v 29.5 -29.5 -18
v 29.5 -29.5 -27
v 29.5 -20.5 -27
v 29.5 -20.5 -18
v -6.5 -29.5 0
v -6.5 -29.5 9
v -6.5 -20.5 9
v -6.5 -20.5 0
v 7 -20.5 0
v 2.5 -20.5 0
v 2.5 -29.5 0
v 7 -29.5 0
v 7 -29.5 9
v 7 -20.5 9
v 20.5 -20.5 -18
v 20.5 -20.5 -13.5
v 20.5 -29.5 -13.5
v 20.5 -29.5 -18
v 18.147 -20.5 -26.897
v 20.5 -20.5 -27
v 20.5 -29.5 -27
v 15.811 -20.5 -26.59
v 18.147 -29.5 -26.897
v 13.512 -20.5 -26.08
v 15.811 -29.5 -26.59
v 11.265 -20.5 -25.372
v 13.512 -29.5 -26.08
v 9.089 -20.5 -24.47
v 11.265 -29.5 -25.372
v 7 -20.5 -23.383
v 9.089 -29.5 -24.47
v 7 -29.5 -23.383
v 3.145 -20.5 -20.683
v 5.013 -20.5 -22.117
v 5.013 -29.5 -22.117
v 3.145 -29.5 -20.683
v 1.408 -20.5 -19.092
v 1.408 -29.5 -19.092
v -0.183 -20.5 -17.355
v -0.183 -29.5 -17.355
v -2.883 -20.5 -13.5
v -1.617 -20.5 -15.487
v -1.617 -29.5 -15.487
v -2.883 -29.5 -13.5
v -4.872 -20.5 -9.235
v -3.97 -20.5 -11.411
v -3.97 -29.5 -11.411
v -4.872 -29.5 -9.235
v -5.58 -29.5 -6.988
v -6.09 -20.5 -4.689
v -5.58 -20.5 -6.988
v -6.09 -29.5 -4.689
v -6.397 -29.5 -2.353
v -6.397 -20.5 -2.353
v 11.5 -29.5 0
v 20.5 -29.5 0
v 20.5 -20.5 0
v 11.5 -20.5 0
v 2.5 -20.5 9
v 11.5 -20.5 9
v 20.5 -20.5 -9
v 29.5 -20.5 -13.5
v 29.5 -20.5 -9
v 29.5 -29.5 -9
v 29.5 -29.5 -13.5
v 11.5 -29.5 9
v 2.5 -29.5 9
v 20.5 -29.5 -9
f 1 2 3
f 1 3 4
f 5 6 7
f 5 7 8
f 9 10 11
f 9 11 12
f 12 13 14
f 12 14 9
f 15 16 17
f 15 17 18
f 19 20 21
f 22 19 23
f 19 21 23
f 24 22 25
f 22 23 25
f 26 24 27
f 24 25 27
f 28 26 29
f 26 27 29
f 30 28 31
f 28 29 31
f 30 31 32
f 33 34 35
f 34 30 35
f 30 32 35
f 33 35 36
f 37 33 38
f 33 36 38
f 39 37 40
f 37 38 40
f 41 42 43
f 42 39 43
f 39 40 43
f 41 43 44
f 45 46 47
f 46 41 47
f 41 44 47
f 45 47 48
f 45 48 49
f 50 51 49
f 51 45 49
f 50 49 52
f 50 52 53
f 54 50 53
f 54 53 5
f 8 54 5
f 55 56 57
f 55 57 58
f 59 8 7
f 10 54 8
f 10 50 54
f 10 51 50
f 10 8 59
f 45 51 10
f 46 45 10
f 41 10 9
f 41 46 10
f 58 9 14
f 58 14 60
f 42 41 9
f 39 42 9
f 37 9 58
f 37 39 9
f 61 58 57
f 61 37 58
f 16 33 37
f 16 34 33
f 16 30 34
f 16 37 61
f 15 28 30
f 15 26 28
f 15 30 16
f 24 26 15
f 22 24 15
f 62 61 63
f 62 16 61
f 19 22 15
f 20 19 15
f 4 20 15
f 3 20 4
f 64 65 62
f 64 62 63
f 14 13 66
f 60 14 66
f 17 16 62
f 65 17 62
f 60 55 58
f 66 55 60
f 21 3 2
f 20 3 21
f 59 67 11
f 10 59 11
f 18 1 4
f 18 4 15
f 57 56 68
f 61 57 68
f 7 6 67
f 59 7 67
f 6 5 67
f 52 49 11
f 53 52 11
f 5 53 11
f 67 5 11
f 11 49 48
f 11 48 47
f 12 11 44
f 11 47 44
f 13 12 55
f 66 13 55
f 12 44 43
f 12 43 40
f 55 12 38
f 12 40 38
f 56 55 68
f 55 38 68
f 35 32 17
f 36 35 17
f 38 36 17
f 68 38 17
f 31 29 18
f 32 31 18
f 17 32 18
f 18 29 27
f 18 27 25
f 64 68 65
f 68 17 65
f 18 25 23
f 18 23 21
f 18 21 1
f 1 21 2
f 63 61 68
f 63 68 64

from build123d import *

# Parameters (mm, degrees)
SKETCH1_R                = 8
SKETCH1_R_2              = 4
BOSS_EXTRUDE1_DEPTH      = 9
BOSS_EXTRUDE1_2_DEPTH    = 9
SKETCH2_R                = 4
BOSS_EXTRUDE3_DEPTH      = 9
FILLET1_R                = 1
CUT_EXTRUDE1_DEPTH       = 214.789616212
SKETCH4_W                = 9
SKETCH4_H                = 27
BOSS_EXTRUDE4_DEPTH      = 75
BOSS_EXTRUDE5_START      = 9
SKETCH5_R                = 25
SKETCH5_R_2              = 4
BOSS_EXTRUDE5_DEPTH      = 9
BOSS_EXTRUDE6_DEPTH      = 4.5
BOSS_EXTRUDE6_DEPTH_BACK = 4.5
BOSS_EXTRUDE7_DEPTH      = 4.5
BOSS_EXTRUDE7_DEPTH_BACK = 4.5
BOSS_EXTRUDE7_START      = -25
SKETCH9_W                = 9
SKETCH9_H                = 7
SKETCH9_H_2              = 9
CUT_EXTRUDE2_DEPTH       = 217.612557346
CUT_EXTRUDE3_DEPTH       = 210.043655728
CUT_EXTRUDE3_DEPTH_BACK  = 210.043655728
SKETCH10_W               = 378.062868676
SKETCH10_H               = 121.353513402
SKETCH10_W_2             = 4.5
SKETCH10_H_2             = 9
SKETCH10_W_3             = 9
SKETCH10_H_3             = 4.5
CUT_EXTRUDE4_DEPTH       = 85.995588121
CUT_EXTRUDE4_DEPTH_BACK  = 85.995588121
SKETCH11_W               = 41.044011783
SKETCH11_H               = 27.30816427
SKETCH11_H_2             = 47.722771097


with BuildPart() as part:
    # Sketch1 → Boss-Extrude1 (new body)
    with BuildSketch(Plane.XY):
        with Locations((-125, 0)):
            Circle(SKETCH1_R)
        with Locations((-125, 0)):
            Circle(SKETCH1_R_2, mode=Mode.SUBTRACT)
    extrude(amount=BOSS_EXTRUDE1_DEPTH)



with BuildPart() as body_2:
    # Sketch1 → Boss-Extrude1 2 (new body)
    with BuildSketch(Plane.XY):
        with Locations((125, 0)):
            Circle(SKETCH1_R)
        with Locations((125, 0)):
            Circle(SKETCH1_R_2, mode=Mode.SUBTRACT)
    extrude(amount=BOSS_EXTRUDE1_2_DEPTH)


with BuildPart() as part_1:
    add(part.part)

    add(body_2.part)  # Boss-Extrude3 merges body 2
    # Sketch2 → Boss-Extrude3 (add)
    with BuildSketch(Plane.XY):
        with BuildLine():
            Line((-175, -75), (125, -75))
            ThreePointArc((125, -75), (130.131670325, -43.377223009), (145.000000492, -14.999999344))
            ThreePointArc((145.000000492, -14.999999344), (143.981414944, 16.269784471), (113.235294528, 22.058823748))
            ThreePointArc((113.235294528, 22.058823748), (25.000000075, 0), (-63.235294395, 22.058823677))
            ThreePointArc((-63.235294395, 22.058823677), (-75.420498385, 24.996463372), (-87.499999896, 21.650635154))
            ThreePointArc((-87.499999896, 21.650635154), (-99.999999954, 18.301270189), (-112.500000024, 21.650635108))
            ThreePointArc((-112.500000024, 21.650635108), (-124.99999995, 25), (-137.49999989, 21.650635158))
            ThreePointArc((-137.49999989, 21.650635158), (-149.999999954, 18.301270189), (-162.50000003, 21.650635112))
            ThreePointArc((-162.50000003, 21.650635112), (-193.705072901, 16.586749162), (-195.000000551, -14.999999265))
            ThreePointArc((-195.000000551, -14.999999265), (-180.13167034, -43.377222962), (-175, -75))
        make_face()
        with Locations((125, 0)):
            Circle(SKETCH2_R, mode=Mode.SUBTRACT)
        with Locations((-175, 0)):
            Circle(SKETCH2_R, mode=Mode.SUBTRACT)
        with Locations((-125, 0)):
            Circle(SKETCH2_R, mode=Mode.SUBTRACT)
        with Locations((-75, 0)):
            Circle(SKETCH2_R, mode=Mode.SUBTRACT)
    extrude(amount=BOSS_EXTRUDE3_DEPTH)

    # Fillet1
    fillet1_edges = [part_1.edges().sort_by_distance(p)[0] for p in [
        (-175, -75, 4.5),
        (125, -75, 4.5),
    ]]
    fillet(fillet1_edges, radius=FILLET1_R)

    # Sketch3 → Cut-Extrude1 (cut, through all)
    with BuildSketch(Plane.XY):
        Polygon((25, 0), (25, -75), (150, -75), (150, 25), (25, 25), align=None)
    extrude(amount=CUT_EXTRUDE1_DEPTH, mode=Mode.SUBTRACT)

    # Sketch4 → Boss-Extrude4 (add)
    with BuildSketch(Plane.XZ.offset(75)):
        with Locations((25, -4.5)):
            Rectangle(SKETCH4_W, SKETCH4_H)
    extrude(amount=-BOSS_EXTRUDE4_DEPTH)

    # Sketch5 → Boss-Extrude5 (add)
    # profile 1 of 4: a face of its own
    with BuildSketch(Plane(origin=(0, 0, -18), x_dir=(-1, 0, 0), z_dir=(0, 0, -1)).offset(BOSS_EXTRUDE5_START)):
        with BuildLine():
            ThreePointArc((-145.000000304, -14.999999594), (-130.131670275, -43.377223158), (-125, -75))
            Line((-125, -75), (-29.5, -75))
            Line((-29.5, -75), (-29.5, 0))
            Line((-29.5, 0), (-100, 0))
            ThreePointArc((-100, 0), (-117.09430609, -23.717082532), (-145.000000304, -14.999999594))
        make_face()
    # profile 2 of 4: a face of its own
    with BuildSketch(Plane(origin=(0, 0, -18), x_dir=(-1, 0, 0), z_dir=(0, 0, -1)).offset(BOSS_EXTRUDE5_START)):
        with Locations((-125, 0)):
            Circle(SKETCH5_R)
        with Locations((-125, 0)):
            Circle(SKETCH5_R_2, mode=Mode.SUBTRACT)
    # profile 3 of 4: a face of its own
    with BuildSketch(Plane(origin=(0, 0, -18), x_dir=(-1, 0, 0), z_dir=(0, 0, -1)).offset(BOSS_EXTRUDE5_START)):
        Polygon((-29.5, 0), (-29.5, -75), (-20.5, -75), (-20.5, 0), (-25, 0), align=None)
    # profile 4 of 4: a face of its own
    with BuildSketch(Plane(origin=(0, 0, -18), x_dir=(-1, 0, 0), z_dir=(0, 0, -1)).offset(BOSS_EXTRUDE5_START)):
        with BuildLine():
            Line((-100, 0), (-29.5, 0))
            Line((-29.5, 0), (-25, 0))
            ThreePointArc((-25, 0), (-70.475429529, 5.598281181), (-113.235293817, 22.058823369))
            ThreePointArc((-113.235293817, 22.058823369), (-103.56267677, 12.86239374), (-100, 0))
        make_face()
    extrude(amount=-BOSS_EXTRUDE5_DEPTH)

    # Sketch7 → Boss-Extrude6 (add, two sides: drawn at the far end of the back side and taken through both)
    with BuildSketch(Plane(origin=(0, -25, 0), x_dir=(1, 0, 0), z_dir=(0, 1, 0)).offset(-BOSS_EXTRUDE6_DEPTH_BACK)):
        with BuildLine():
            Line((56.5, 18), (29.5, 18))
            Line((29.5, 18), (29.5, -9))
            ThreePointArc((29.5, -9), (48.591883092, -1.091883092), (56.5, 18))
        make_face()
        with BuildLine():
            Line((-6.5, 0), (20.5, 0))
            Line((20.5, 0), (20.5, 27))
            ThreePointArc((20.5, 27), (1.408116908, 19.091883092), (-6.5, 0))
        make_face()
    extrude(amount=BOSS_EXTRUDE6_DEPTH + BOSS_EXTRUDE6_DEPTH_BACK)

    # Sketch7<3> → Boss-Extrude7 (add, two sides: drawn at the far end of the back side and taken through both)
    with BuildSketch(Plane(origin=(0, -25, 0), x_dir=(1, 0, 0), z_dir=(0, 1, 0)).offset(BOSS_EXTRUDE7_START - BOSS_EXTRUDE7_DEPTH_BACK)):
        with BuildLine():
            Line((56.5, 18), (29.5, 18))
            Line((29.5, 18), (29.5, -9))
            ThreePointArc((29.5, -9), (48.591883092, -1.091883092), (56.5, 18))
        make_face()
        with BuildLine():
            Line((-6.5, 0), (20.5, 0))
            Line((20.5, 0), (20.5, 27))
            ThreePointArc((20.5, 27), (1.408116908, 19.091883092), (-6.5, 0))
        make_face()
    extrude(amount=BOSS_EXTRUDE7_DEPTH + BOSS_EXTRUDE7_DEPTH_BACK)

    # Sketch9 → Cut-Extrude2 (cut, through all)
    with BuildSketch(Plane.XY.offset(9)):
        with Locations((-160.208548161, -53.5)):
            Rectangle(SKETCH9_W, SKETCH9_H)
        with Locations((-160.208548161, -70.5)):
            Rectangle(SKETCH9_W, SKETCH9_H_2)
        with Locations((-25.351798772, -53.5)):
            Rectangle(SKETCH9_W, SKETCH9_H)
        with Locations((-25.351798772, -70.5)):
            Rectangle(SKETCH9_W, SKETCH9_H_2)
        with Locations((109.504950616, -53.5)):
            Rectangle(SKETCH9_W, SKETCH9_H)
        with Locations((109.504950616, -70.5)):
            Rectangle(SKETCH9_W, SKETCH9_H_2)
    extrude(amount=-CUT_EXTRUDE2_DEPTH, mode=Mode.SUBTRACT)

    # Sketch10 → Cut-Extrude3 (cut, two sides: drawn at the far end of the back side and taken through both)
    # profile 1 of 11: a face of its own
    with BuildSketch(Plane(origin=(0, -20.5, 0), x_dir=(1, 0, 0), z_dir=(0, 1, 0)).offset(-CUT_EXTRUDE3_DEPTH_BACK)):
        with Locations((-22.824558852, 8.698613075)):
            Rectangle(SKETCH10_W, SKETCH10_H)
        with BuildLine():
            ThreePointArc((-6.5, 0), (-4.122805694, 11.077790383), (2.590180724, 20.204909638))
            ThreePointArc((2.590180724, 20.204909638), (30.603376531, 44.977445399), (56.5, 18))
            ThreePointArc((56.5, 18), (54.122805694, 6.922209617), (47.409819276, -2.204909638))
            ThreePointArc((47.409819276, -2.204909638), (23.974453078, -26.775514483), (-4.955844123, -9))
            Line((-4.955844123, -9), (-6.5, -9))
            Line((-6.5, -9), (-6.5, 0))
        make_face(mode=Mode.SUBTRACT)
    # profile 2 of 11: a face of its own
    with BuildSketch(Plane(origin=(0, -20.5, 0), x_dir=(1, 0, 0), z_dir=(0, 1, 0)).offset(-CUT_EXTRUDE3_DEPTH_BACK)):
        with BuildLine():
            ThreePointArc((47.5, 0), (42.545407685, 15.588457268), (29.5, 25.455844123))
            Line((29.5, 25.455844123), (29.5, 18))
            Line((29.5, 18), (29.5, 13.5))
            Line((29.5, 13.5), (29.5, 9))
            Line((29.5, 9), (29.5, 4.5))
            Line((29.5, 4.5), (29.5, 0))
            Line((29.5, 0), (29.5, -9))
            ThreePointArc((29.5, -9), (39.077772178, -7.244133578), (47.409819276, -2.204909638))
            ThreePointArc((47.409819276, -2.204909638), (47.477445399, -1.103376531), (47.5, 0))
        make_face()
    # profile 3 of 11: a face of its own
    with BuildSketch(Plane(origin=(0, -20.5, 0), x_dir=(1, 0, 0), z_dir=(0, 1, 0)).offset(-CUT_EXTRUDE3_DEPTH_BACK)):
        with BuildLine():
            ThreePointArc((2.590180724, 20.204909638), (10.922227822, 25.244133578), (20.5, 27))
            Line((20.5, 27), (29.5, 27))
            Line((29.5, 27), (29.5, 25.455844123))
            ThreePointArc((29.5, 25.455844123), (42.545407685, 15.588457268), (47.5, 0))
            ThreePointArc((47.5, 0), (47.477445399, -1.103376531), (47.409819276, -2.204909638))
            ThreePointArc((47.409819276, -2.204909638), (54.122805694, 6.922209617), (56.5, 18))
            ThreePointArc((56.5, 18), (30.603376531, 44.977445399), (2.590180724, 20.204909638))
        make_face()
    # profile 4 of 11: a face of its own
    with BuildSketch(Plane(origin=(0, -20.5, 0), x_dir=(1, 0, 0), z_dir=(0, 1, 0)).offset(-CUT_EXTRUDE3_DEPTH_BACK)):
        with Locations((4.75, -4.5)):
            Rectangle(SKETCH10_W_2, SKETCH10_H_2)
    # profile 5 of 11: a face of its own
    with BuildSketch(Plane(origin=(0, -20.5, 0), x_dir=(1, 0, 0), z_dir=(0, 1, 0)).offset(-CUT_EXTRUDE3_DEPTH_BACK)):
        with Locations((25, 15.75)):
            Rectangle(SKETCH10_W_3, SKETCH10_H_3)
    # profile 6 of 11: a face of its own
    with BuildSketch(Plane(origin=(0, -20.5, 0), x_dir=(1, 0, 0), z_dir=(0, 1, 0)).offset(-CUT_EXTRUDE3_DEPTH_BACK)):
        with Locations((25, 6.75)):
            Rectangle(SKETCH10_W_3, SKETCH10_H_3)
    # profile 7 of 11: a face of its own
    with BuildSketch(Plane(origin=(0, -20.5, 0), x_dir=(1, 0, 0), z_dir=(0, 1, 0)).offset(-CUT_EXTRUDE3_DEPTH_BACK)):
        with Locations((25, 2.25)):
            Rectangle(SKETCH10_W_3, SKETCH10_H_3)
    # profile 8 of 11: a face of its own
    with BuildSketch(Plane(origin=(0, -20.5, 0), x_dir=(1, 0, 0), z_dir=(0, 1, 0)).offset(-CUT_EXTRUDE3_DEPTH_BACK)):
        with BuildLine():
            Line((20.5, 0), (11.5, 0))
            Line((11.5, 0), (11.5, -2.124611797))
            ThreePointArc((11.5, -2.124611797), (15.739349233, -5.230249471), (20.5, -7.455844123))
            Line((20.5, -7.455844123), (20.5, 0))
        make_face()
    # profile 9 of 11: a face of its own
    with BuildSketch(Plane(origin=(0, -20.5, 0), x_dir=(1, 0, 0), z_dir=(0, 1, 0)).offset(-CUT_EXTRUDE3_DEPTH_BACK)):
        with BuildLine():
            ThreePointArc((20.5, -7.455844123), (15.739349233, -5.230249471), (11.5, -2.124611797))
            Line((11.5, -2.124611797), (11.5, -9))
            Line((11.5, -9), (20.5, -9))
            Line((20.5, -9), (20.5, -7.455844123))
        make_face()
    # profile 10 of 11: a face of its own
    with BuildSketch(Plane(origin=(0, -20.5, 0), x_dir=(1, 0, 0), z_dir=(0, 1, 0)).offset(-CUT_EXTRUDE3_DEPTH_BACK)):
        with BuildLine():
            Line((20.5, -9), (29.5, -9))
            ThreePointArc((29.5, -9), (24.934246574, -8.611161111), (20.5, -7.455844123))
            Line((20.5, -7.455844123), (20.5, -9))
        make_face()
    # profile 11 of 11: a face of its own
    with BuildSketch(Plane(origin=(0, -20.5, 0), x_dir=(1, 0, 0), z_dir=(0, 1, 0)).offset(-CUT_EXTRUDE3_DEPTH_BACK)):
        with BuildLine():
            ThreePointArc((20.5, -7.455844123), (24.934246574, -8.611161111), (29.5, -9))
            Line((29.5, -9), (29.5, 0))
            Line((29.5, 0), (20.5, 0))
            Line((20.5, 0), (20.5, -7.455844123))
        make_face()
    extrude(amount=CUT_EXTRUDE3_DEPTH + CUT_EXTRUDE3_DEPTH_BACK, mode=Mode.SUBTRACT)

    # Sketch11 → Cut-Extrude4 (cut, two sides: drawn at the far end of the back side and taken through both)
    with BuildSketch(Plane.XY.offset(-CUT_EXTRUDE4_DEPTH_BACK)):
        with Locations((11.617711519, -6.845917865)):
            Rectangle(SKETCH11_W, SKETCH11_H)
        with Locations((11.617711519, -53.361385549)):
            Rectangle(SKETCH11_W, SKETCH11_H_2)
    extrude(amount=CUT_EXTRUDE4_DEPTH + CUT_EXTRUDE4_DEPTH_BACK, mode=Mode.SUBTRACT)


solid = part_1.part
